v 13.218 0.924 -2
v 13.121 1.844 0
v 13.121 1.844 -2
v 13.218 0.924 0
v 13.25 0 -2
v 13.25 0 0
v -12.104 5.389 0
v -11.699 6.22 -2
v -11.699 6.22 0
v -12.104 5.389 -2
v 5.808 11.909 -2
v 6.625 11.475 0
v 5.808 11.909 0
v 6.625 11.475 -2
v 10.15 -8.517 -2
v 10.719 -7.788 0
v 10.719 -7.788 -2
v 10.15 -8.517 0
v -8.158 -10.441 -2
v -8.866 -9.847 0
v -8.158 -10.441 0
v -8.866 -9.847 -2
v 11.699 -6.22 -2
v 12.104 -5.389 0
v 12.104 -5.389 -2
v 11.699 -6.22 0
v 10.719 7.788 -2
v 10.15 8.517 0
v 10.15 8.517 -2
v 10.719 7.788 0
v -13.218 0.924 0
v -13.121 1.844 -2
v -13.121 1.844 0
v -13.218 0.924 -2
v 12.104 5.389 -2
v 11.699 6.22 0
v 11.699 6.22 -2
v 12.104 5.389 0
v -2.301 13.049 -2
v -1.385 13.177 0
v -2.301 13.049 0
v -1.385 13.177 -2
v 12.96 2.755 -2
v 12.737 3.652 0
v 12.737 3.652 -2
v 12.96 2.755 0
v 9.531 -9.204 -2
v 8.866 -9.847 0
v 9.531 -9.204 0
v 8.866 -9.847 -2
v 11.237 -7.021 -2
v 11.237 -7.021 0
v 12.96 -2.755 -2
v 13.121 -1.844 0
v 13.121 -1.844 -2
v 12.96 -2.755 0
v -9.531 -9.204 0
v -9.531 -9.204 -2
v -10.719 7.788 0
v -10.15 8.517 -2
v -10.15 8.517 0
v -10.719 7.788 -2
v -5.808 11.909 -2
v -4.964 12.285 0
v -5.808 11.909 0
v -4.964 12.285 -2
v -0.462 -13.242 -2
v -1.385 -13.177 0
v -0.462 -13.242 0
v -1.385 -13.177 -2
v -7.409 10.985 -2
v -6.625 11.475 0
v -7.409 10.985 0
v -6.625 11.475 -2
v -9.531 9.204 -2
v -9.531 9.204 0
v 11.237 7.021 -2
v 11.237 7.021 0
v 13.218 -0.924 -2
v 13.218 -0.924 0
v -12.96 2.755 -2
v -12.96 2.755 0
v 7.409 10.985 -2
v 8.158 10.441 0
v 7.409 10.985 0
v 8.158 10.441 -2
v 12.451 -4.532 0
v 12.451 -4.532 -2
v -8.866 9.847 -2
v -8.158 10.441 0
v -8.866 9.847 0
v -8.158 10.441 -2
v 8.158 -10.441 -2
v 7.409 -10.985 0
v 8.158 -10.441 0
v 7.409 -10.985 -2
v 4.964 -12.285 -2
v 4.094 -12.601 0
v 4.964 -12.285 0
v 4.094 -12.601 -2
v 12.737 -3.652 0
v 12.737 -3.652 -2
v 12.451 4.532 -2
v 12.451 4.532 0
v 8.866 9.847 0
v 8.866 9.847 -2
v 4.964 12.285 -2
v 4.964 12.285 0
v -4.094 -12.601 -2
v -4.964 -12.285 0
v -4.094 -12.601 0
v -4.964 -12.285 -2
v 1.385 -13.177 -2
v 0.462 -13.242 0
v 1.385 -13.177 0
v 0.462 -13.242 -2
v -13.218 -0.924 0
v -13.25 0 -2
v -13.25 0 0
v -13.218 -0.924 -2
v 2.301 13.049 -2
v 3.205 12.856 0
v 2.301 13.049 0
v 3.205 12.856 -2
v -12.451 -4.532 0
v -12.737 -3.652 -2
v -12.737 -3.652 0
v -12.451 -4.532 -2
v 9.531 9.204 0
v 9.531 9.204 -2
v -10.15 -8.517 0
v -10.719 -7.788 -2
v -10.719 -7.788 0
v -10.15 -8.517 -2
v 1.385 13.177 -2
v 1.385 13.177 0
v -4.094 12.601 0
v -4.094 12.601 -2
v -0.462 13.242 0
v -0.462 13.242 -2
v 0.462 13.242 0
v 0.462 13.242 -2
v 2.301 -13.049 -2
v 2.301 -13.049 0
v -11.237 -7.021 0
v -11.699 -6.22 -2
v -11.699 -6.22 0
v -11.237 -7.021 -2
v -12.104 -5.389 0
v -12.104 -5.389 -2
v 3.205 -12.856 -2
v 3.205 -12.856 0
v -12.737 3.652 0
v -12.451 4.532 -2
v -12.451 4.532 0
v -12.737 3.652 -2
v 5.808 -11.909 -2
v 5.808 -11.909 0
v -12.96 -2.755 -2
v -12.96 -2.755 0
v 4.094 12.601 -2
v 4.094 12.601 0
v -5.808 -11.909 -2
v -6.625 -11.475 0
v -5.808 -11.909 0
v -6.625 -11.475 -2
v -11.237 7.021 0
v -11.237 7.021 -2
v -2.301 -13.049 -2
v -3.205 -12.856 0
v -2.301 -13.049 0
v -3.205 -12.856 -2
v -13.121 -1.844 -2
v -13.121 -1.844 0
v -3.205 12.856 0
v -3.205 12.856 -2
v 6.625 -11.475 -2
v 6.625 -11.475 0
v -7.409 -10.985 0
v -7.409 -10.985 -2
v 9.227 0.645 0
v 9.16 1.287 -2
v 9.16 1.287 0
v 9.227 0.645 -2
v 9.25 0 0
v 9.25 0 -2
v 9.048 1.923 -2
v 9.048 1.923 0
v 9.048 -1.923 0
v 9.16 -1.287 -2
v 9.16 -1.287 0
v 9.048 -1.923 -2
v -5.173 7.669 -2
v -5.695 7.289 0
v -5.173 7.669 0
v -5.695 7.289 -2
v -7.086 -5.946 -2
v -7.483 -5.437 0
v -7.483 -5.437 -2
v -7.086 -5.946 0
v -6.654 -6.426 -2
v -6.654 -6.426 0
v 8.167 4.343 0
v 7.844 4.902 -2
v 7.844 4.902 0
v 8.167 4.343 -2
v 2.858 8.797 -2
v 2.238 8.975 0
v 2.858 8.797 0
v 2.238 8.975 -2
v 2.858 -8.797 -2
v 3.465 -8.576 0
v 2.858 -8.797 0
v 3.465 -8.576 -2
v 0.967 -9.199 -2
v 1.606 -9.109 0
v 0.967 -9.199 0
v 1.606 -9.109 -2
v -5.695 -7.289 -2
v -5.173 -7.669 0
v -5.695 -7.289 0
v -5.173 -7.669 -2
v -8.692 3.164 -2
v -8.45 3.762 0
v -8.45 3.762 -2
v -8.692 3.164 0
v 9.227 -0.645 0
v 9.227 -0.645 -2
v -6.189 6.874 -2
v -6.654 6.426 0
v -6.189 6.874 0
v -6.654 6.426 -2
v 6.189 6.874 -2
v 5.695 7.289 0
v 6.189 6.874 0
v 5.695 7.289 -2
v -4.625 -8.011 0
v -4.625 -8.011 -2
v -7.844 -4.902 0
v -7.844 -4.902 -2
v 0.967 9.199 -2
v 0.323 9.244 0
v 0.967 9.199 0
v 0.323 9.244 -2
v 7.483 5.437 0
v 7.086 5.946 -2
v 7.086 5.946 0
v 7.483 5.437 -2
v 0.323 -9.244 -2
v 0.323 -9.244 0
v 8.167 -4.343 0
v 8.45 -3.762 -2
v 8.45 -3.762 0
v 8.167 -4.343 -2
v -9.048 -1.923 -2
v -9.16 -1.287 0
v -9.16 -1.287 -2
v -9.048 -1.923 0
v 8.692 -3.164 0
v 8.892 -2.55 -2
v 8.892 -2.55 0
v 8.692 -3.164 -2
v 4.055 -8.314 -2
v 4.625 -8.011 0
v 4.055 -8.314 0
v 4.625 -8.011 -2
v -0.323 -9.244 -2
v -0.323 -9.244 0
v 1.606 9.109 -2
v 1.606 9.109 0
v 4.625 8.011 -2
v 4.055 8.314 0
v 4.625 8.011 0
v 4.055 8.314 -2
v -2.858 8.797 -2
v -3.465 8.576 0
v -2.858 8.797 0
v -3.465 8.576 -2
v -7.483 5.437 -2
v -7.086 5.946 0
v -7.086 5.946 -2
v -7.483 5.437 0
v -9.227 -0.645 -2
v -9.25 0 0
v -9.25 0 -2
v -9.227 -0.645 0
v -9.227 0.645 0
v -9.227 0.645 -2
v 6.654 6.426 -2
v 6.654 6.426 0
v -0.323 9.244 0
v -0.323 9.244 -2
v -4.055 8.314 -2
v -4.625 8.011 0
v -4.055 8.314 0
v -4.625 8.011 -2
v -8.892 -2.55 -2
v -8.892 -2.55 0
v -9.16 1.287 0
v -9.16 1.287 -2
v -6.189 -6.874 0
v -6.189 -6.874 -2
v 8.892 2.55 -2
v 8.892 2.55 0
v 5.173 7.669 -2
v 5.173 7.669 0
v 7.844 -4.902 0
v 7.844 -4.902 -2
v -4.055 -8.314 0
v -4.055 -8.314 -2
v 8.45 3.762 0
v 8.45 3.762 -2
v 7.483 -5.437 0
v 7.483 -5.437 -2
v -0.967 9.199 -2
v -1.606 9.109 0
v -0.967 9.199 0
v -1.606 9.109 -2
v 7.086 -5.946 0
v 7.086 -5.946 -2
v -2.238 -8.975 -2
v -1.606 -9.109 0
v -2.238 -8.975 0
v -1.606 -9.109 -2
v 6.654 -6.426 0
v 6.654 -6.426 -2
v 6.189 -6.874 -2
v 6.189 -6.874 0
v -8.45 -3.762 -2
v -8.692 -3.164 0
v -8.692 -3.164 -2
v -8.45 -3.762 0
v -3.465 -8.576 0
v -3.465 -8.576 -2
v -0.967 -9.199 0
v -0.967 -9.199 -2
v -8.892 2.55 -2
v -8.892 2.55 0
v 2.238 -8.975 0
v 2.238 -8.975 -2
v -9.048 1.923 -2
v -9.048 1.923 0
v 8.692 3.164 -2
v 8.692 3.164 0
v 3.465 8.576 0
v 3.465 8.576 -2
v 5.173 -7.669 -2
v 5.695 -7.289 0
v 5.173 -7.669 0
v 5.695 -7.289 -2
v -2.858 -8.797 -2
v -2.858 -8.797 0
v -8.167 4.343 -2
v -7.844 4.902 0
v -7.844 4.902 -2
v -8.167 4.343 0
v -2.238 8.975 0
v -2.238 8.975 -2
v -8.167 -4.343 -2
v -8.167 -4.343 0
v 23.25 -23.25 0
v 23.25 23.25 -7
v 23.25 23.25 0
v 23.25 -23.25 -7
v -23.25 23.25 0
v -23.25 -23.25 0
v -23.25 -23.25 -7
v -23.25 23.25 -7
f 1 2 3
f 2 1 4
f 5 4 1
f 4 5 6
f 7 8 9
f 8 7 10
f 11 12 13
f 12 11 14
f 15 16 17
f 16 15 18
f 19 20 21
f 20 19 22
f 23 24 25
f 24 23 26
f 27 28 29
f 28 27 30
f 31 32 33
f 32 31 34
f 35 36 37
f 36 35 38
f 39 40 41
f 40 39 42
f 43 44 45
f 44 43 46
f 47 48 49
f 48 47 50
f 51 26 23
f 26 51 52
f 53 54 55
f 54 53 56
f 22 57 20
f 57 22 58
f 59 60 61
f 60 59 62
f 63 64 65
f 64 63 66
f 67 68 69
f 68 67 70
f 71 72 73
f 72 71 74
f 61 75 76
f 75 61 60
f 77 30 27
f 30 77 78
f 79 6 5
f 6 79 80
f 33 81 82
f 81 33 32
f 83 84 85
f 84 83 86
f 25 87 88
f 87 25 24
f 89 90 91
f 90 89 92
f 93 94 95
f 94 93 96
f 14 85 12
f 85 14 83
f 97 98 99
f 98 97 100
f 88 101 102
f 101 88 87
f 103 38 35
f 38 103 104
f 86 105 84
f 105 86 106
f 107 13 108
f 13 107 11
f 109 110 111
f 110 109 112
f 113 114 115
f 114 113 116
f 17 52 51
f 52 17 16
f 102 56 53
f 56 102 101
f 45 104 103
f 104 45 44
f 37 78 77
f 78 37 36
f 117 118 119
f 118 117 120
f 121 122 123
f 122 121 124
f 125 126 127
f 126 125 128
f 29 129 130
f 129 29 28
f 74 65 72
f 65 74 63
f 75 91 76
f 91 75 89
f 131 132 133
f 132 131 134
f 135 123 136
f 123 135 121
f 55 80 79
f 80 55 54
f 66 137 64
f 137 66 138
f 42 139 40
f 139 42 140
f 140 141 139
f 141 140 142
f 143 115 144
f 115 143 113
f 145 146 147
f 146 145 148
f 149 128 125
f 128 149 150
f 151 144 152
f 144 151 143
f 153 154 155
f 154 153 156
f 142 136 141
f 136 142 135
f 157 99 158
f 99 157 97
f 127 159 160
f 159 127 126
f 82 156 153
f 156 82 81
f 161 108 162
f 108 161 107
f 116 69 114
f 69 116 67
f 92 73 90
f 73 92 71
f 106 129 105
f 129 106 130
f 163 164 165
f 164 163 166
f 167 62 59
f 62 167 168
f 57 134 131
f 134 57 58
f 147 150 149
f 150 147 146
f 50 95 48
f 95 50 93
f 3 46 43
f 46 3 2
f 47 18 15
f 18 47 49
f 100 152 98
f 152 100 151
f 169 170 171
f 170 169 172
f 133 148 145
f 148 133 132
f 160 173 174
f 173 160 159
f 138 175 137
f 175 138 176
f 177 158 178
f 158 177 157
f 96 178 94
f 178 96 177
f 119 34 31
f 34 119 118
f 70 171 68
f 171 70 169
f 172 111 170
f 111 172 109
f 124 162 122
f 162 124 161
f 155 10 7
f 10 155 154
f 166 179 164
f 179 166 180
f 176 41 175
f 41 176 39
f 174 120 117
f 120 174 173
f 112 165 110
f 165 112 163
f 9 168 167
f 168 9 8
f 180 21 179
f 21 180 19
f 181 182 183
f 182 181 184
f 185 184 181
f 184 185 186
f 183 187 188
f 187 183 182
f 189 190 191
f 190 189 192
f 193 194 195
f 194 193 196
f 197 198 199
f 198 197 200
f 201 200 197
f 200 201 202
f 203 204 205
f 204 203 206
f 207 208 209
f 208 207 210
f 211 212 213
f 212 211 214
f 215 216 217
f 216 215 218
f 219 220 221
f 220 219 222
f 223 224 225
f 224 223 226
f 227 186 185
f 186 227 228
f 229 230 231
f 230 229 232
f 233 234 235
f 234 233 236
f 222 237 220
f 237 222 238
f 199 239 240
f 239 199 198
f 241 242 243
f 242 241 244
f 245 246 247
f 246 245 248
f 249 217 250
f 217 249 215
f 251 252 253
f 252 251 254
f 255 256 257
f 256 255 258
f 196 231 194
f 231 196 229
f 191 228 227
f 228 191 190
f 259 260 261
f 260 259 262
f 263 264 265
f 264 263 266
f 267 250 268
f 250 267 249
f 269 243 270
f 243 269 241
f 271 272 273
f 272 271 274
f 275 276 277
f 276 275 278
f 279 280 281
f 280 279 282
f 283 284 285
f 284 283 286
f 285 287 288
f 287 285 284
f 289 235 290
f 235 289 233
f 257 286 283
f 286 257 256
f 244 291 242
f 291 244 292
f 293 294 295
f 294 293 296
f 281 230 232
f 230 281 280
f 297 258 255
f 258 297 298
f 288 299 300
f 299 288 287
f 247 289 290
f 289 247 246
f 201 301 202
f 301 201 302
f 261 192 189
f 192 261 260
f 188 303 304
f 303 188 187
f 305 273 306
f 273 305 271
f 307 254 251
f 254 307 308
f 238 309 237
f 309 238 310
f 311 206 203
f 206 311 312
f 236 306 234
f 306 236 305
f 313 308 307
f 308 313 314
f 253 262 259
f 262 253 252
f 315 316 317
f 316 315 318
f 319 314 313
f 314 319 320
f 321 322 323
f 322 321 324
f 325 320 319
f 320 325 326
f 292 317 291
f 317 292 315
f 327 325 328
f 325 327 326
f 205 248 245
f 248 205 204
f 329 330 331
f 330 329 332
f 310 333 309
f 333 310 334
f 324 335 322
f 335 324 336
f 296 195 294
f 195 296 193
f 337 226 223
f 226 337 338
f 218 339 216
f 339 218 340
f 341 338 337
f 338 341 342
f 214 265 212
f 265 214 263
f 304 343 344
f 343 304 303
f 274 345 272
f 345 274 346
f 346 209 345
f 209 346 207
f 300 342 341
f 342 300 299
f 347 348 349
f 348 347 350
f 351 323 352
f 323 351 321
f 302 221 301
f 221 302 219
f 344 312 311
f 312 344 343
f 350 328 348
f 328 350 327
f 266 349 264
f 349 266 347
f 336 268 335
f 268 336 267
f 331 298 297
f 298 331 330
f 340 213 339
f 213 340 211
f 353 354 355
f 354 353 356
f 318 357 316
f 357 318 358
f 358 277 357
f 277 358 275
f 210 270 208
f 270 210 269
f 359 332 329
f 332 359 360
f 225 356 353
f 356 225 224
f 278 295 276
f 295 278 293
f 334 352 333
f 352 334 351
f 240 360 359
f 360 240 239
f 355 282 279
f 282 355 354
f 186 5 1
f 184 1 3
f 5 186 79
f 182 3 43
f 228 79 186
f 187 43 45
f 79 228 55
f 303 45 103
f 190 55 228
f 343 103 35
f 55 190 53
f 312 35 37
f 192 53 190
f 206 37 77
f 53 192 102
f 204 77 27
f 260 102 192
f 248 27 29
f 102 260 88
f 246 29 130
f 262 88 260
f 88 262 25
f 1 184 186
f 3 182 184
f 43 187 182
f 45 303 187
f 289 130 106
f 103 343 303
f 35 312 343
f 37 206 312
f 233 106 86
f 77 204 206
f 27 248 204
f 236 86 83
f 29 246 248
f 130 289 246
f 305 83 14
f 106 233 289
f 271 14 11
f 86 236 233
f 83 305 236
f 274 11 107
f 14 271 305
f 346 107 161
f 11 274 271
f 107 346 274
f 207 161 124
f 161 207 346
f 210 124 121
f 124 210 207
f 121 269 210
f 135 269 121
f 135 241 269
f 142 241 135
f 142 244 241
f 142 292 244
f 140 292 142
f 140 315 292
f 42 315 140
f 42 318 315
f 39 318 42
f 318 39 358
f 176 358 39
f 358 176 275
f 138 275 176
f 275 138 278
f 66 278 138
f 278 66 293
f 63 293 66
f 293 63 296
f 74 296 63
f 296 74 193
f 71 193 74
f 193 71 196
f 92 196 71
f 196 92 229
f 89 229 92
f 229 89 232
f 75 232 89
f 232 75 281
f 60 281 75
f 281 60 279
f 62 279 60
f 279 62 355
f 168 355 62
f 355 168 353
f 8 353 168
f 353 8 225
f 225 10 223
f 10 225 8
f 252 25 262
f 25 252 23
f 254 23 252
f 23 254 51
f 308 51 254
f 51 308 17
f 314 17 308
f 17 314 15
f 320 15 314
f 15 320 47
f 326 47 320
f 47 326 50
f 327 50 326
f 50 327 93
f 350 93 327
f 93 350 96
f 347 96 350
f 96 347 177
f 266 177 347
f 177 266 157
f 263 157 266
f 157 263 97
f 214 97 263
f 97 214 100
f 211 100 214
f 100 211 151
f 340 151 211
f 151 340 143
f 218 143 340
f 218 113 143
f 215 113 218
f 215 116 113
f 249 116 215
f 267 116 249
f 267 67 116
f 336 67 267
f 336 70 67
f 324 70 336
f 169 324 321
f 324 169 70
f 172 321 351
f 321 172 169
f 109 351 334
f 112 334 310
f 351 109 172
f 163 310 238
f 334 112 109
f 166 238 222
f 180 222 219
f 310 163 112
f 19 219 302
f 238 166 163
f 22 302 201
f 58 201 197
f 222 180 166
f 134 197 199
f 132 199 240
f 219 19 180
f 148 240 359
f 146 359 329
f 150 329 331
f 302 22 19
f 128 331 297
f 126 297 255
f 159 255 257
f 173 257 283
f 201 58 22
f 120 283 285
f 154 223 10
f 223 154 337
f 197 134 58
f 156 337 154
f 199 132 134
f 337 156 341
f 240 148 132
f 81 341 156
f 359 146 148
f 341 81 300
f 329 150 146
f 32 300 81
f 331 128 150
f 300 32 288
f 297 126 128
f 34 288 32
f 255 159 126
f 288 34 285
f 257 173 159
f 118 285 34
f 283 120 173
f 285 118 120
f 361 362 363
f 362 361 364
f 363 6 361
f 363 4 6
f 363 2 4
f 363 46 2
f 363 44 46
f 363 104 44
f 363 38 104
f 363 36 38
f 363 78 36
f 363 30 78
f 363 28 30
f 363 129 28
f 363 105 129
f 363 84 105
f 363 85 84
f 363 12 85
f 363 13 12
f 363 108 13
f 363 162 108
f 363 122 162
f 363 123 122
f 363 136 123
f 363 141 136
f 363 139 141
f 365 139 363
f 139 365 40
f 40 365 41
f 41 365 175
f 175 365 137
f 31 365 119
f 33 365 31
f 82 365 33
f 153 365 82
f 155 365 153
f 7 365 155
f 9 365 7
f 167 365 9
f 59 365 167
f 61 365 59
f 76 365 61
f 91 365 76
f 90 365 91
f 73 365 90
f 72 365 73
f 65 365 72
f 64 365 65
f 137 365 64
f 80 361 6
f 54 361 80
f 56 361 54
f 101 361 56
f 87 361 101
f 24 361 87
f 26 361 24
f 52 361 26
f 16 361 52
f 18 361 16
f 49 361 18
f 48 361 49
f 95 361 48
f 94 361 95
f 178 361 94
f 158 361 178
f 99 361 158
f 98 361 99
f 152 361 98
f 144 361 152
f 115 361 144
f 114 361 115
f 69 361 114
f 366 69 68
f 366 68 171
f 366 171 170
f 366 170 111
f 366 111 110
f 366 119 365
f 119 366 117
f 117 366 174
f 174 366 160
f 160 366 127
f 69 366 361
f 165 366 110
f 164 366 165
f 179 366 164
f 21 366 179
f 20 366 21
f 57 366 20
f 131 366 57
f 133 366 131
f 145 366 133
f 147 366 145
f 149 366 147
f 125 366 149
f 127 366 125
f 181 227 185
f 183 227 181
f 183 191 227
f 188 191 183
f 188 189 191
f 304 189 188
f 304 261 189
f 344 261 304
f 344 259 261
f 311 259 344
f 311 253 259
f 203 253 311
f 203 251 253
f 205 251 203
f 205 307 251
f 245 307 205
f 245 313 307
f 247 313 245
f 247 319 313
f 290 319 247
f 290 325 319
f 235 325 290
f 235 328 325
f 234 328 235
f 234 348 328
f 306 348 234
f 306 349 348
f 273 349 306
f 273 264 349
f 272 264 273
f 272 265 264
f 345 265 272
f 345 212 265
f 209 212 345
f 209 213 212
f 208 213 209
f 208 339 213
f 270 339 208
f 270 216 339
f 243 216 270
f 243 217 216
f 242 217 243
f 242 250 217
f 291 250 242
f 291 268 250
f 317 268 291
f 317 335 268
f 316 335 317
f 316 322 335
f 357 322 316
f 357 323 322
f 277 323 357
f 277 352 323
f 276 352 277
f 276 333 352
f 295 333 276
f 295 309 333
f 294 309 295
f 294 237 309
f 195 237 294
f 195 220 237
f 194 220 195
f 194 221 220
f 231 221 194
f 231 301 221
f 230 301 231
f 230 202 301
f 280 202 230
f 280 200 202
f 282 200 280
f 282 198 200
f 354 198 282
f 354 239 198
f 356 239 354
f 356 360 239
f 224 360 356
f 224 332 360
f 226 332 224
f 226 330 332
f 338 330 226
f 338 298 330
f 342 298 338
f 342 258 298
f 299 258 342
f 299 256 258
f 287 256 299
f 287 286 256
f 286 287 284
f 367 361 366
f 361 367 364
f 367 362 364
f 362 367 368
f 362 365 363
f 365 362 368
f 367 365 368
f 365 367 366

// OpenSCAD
// file: oring.scad
// Name: Oring
// Description: 
// Oring for the bung/socket interface.
// Created: 30 Aug 2021
// Author: Krisjanis Rijnieks

include <variables.scad>

Oring();

module Oring(){
  difference(){
    cylinder(
      d = threadDiameter + oringThickness * 2 + oringTolerance,
      h = oringHeight,
      center = true);
    cylinder(
      d = threadDiameter + oringTolerance,
      h = oringHeight + 1,
      center = true);
  }
}
// file: variables.scad
$fn = 90;

threadPitch = 2;
threadToothAngle = 30;
threadTolerance = 0.5;
threadHeight = 17;
threadDiameter = 19;

socketOuterDiameter = 22;
socketLipHeight = .5;

socketMountDiameterA = 36;
socketMountDiameterB = 16;
socketMountScrewOffset = 22;
socketMountHeight = 4;
socketMountScrewDiameter = 5;
socketMountScrewPocketDepth = 1;

bungCapDiameter = threadDiameter + 8;
bungCapHeight = 4;
bungHandleHeight = 12;
bungHandleFilet = 6;
bungRetainerDiameter = 2;

oringHeight = 2;
oringThickness = 4;
oringTolerance = -0.5;

moldMarginXY = 10;
moldMarginZ = 5;
// main file
// Name: Mold
// Description: 
// Oring mold for the bung/socket interface.
// Created: 30 Aug 2021
// Author: Krisjanis Rijnieks

include <variables.scad>
use <oring.scad>

difference(){
  MoldBase();
  union(){
    Oring();
    translate([0, 0, -oringHeight / 2]) Oring();
  }
}

module MoldBase(){
  mirror([0, 0, 1])
  linear_extrude(height = oringHeight + moldMarginZ){
    square(
      size = threadDiameter + oringThickness * 2 + oringTolerance + moldMarginXY * 2,
      center = true);
  }
}
